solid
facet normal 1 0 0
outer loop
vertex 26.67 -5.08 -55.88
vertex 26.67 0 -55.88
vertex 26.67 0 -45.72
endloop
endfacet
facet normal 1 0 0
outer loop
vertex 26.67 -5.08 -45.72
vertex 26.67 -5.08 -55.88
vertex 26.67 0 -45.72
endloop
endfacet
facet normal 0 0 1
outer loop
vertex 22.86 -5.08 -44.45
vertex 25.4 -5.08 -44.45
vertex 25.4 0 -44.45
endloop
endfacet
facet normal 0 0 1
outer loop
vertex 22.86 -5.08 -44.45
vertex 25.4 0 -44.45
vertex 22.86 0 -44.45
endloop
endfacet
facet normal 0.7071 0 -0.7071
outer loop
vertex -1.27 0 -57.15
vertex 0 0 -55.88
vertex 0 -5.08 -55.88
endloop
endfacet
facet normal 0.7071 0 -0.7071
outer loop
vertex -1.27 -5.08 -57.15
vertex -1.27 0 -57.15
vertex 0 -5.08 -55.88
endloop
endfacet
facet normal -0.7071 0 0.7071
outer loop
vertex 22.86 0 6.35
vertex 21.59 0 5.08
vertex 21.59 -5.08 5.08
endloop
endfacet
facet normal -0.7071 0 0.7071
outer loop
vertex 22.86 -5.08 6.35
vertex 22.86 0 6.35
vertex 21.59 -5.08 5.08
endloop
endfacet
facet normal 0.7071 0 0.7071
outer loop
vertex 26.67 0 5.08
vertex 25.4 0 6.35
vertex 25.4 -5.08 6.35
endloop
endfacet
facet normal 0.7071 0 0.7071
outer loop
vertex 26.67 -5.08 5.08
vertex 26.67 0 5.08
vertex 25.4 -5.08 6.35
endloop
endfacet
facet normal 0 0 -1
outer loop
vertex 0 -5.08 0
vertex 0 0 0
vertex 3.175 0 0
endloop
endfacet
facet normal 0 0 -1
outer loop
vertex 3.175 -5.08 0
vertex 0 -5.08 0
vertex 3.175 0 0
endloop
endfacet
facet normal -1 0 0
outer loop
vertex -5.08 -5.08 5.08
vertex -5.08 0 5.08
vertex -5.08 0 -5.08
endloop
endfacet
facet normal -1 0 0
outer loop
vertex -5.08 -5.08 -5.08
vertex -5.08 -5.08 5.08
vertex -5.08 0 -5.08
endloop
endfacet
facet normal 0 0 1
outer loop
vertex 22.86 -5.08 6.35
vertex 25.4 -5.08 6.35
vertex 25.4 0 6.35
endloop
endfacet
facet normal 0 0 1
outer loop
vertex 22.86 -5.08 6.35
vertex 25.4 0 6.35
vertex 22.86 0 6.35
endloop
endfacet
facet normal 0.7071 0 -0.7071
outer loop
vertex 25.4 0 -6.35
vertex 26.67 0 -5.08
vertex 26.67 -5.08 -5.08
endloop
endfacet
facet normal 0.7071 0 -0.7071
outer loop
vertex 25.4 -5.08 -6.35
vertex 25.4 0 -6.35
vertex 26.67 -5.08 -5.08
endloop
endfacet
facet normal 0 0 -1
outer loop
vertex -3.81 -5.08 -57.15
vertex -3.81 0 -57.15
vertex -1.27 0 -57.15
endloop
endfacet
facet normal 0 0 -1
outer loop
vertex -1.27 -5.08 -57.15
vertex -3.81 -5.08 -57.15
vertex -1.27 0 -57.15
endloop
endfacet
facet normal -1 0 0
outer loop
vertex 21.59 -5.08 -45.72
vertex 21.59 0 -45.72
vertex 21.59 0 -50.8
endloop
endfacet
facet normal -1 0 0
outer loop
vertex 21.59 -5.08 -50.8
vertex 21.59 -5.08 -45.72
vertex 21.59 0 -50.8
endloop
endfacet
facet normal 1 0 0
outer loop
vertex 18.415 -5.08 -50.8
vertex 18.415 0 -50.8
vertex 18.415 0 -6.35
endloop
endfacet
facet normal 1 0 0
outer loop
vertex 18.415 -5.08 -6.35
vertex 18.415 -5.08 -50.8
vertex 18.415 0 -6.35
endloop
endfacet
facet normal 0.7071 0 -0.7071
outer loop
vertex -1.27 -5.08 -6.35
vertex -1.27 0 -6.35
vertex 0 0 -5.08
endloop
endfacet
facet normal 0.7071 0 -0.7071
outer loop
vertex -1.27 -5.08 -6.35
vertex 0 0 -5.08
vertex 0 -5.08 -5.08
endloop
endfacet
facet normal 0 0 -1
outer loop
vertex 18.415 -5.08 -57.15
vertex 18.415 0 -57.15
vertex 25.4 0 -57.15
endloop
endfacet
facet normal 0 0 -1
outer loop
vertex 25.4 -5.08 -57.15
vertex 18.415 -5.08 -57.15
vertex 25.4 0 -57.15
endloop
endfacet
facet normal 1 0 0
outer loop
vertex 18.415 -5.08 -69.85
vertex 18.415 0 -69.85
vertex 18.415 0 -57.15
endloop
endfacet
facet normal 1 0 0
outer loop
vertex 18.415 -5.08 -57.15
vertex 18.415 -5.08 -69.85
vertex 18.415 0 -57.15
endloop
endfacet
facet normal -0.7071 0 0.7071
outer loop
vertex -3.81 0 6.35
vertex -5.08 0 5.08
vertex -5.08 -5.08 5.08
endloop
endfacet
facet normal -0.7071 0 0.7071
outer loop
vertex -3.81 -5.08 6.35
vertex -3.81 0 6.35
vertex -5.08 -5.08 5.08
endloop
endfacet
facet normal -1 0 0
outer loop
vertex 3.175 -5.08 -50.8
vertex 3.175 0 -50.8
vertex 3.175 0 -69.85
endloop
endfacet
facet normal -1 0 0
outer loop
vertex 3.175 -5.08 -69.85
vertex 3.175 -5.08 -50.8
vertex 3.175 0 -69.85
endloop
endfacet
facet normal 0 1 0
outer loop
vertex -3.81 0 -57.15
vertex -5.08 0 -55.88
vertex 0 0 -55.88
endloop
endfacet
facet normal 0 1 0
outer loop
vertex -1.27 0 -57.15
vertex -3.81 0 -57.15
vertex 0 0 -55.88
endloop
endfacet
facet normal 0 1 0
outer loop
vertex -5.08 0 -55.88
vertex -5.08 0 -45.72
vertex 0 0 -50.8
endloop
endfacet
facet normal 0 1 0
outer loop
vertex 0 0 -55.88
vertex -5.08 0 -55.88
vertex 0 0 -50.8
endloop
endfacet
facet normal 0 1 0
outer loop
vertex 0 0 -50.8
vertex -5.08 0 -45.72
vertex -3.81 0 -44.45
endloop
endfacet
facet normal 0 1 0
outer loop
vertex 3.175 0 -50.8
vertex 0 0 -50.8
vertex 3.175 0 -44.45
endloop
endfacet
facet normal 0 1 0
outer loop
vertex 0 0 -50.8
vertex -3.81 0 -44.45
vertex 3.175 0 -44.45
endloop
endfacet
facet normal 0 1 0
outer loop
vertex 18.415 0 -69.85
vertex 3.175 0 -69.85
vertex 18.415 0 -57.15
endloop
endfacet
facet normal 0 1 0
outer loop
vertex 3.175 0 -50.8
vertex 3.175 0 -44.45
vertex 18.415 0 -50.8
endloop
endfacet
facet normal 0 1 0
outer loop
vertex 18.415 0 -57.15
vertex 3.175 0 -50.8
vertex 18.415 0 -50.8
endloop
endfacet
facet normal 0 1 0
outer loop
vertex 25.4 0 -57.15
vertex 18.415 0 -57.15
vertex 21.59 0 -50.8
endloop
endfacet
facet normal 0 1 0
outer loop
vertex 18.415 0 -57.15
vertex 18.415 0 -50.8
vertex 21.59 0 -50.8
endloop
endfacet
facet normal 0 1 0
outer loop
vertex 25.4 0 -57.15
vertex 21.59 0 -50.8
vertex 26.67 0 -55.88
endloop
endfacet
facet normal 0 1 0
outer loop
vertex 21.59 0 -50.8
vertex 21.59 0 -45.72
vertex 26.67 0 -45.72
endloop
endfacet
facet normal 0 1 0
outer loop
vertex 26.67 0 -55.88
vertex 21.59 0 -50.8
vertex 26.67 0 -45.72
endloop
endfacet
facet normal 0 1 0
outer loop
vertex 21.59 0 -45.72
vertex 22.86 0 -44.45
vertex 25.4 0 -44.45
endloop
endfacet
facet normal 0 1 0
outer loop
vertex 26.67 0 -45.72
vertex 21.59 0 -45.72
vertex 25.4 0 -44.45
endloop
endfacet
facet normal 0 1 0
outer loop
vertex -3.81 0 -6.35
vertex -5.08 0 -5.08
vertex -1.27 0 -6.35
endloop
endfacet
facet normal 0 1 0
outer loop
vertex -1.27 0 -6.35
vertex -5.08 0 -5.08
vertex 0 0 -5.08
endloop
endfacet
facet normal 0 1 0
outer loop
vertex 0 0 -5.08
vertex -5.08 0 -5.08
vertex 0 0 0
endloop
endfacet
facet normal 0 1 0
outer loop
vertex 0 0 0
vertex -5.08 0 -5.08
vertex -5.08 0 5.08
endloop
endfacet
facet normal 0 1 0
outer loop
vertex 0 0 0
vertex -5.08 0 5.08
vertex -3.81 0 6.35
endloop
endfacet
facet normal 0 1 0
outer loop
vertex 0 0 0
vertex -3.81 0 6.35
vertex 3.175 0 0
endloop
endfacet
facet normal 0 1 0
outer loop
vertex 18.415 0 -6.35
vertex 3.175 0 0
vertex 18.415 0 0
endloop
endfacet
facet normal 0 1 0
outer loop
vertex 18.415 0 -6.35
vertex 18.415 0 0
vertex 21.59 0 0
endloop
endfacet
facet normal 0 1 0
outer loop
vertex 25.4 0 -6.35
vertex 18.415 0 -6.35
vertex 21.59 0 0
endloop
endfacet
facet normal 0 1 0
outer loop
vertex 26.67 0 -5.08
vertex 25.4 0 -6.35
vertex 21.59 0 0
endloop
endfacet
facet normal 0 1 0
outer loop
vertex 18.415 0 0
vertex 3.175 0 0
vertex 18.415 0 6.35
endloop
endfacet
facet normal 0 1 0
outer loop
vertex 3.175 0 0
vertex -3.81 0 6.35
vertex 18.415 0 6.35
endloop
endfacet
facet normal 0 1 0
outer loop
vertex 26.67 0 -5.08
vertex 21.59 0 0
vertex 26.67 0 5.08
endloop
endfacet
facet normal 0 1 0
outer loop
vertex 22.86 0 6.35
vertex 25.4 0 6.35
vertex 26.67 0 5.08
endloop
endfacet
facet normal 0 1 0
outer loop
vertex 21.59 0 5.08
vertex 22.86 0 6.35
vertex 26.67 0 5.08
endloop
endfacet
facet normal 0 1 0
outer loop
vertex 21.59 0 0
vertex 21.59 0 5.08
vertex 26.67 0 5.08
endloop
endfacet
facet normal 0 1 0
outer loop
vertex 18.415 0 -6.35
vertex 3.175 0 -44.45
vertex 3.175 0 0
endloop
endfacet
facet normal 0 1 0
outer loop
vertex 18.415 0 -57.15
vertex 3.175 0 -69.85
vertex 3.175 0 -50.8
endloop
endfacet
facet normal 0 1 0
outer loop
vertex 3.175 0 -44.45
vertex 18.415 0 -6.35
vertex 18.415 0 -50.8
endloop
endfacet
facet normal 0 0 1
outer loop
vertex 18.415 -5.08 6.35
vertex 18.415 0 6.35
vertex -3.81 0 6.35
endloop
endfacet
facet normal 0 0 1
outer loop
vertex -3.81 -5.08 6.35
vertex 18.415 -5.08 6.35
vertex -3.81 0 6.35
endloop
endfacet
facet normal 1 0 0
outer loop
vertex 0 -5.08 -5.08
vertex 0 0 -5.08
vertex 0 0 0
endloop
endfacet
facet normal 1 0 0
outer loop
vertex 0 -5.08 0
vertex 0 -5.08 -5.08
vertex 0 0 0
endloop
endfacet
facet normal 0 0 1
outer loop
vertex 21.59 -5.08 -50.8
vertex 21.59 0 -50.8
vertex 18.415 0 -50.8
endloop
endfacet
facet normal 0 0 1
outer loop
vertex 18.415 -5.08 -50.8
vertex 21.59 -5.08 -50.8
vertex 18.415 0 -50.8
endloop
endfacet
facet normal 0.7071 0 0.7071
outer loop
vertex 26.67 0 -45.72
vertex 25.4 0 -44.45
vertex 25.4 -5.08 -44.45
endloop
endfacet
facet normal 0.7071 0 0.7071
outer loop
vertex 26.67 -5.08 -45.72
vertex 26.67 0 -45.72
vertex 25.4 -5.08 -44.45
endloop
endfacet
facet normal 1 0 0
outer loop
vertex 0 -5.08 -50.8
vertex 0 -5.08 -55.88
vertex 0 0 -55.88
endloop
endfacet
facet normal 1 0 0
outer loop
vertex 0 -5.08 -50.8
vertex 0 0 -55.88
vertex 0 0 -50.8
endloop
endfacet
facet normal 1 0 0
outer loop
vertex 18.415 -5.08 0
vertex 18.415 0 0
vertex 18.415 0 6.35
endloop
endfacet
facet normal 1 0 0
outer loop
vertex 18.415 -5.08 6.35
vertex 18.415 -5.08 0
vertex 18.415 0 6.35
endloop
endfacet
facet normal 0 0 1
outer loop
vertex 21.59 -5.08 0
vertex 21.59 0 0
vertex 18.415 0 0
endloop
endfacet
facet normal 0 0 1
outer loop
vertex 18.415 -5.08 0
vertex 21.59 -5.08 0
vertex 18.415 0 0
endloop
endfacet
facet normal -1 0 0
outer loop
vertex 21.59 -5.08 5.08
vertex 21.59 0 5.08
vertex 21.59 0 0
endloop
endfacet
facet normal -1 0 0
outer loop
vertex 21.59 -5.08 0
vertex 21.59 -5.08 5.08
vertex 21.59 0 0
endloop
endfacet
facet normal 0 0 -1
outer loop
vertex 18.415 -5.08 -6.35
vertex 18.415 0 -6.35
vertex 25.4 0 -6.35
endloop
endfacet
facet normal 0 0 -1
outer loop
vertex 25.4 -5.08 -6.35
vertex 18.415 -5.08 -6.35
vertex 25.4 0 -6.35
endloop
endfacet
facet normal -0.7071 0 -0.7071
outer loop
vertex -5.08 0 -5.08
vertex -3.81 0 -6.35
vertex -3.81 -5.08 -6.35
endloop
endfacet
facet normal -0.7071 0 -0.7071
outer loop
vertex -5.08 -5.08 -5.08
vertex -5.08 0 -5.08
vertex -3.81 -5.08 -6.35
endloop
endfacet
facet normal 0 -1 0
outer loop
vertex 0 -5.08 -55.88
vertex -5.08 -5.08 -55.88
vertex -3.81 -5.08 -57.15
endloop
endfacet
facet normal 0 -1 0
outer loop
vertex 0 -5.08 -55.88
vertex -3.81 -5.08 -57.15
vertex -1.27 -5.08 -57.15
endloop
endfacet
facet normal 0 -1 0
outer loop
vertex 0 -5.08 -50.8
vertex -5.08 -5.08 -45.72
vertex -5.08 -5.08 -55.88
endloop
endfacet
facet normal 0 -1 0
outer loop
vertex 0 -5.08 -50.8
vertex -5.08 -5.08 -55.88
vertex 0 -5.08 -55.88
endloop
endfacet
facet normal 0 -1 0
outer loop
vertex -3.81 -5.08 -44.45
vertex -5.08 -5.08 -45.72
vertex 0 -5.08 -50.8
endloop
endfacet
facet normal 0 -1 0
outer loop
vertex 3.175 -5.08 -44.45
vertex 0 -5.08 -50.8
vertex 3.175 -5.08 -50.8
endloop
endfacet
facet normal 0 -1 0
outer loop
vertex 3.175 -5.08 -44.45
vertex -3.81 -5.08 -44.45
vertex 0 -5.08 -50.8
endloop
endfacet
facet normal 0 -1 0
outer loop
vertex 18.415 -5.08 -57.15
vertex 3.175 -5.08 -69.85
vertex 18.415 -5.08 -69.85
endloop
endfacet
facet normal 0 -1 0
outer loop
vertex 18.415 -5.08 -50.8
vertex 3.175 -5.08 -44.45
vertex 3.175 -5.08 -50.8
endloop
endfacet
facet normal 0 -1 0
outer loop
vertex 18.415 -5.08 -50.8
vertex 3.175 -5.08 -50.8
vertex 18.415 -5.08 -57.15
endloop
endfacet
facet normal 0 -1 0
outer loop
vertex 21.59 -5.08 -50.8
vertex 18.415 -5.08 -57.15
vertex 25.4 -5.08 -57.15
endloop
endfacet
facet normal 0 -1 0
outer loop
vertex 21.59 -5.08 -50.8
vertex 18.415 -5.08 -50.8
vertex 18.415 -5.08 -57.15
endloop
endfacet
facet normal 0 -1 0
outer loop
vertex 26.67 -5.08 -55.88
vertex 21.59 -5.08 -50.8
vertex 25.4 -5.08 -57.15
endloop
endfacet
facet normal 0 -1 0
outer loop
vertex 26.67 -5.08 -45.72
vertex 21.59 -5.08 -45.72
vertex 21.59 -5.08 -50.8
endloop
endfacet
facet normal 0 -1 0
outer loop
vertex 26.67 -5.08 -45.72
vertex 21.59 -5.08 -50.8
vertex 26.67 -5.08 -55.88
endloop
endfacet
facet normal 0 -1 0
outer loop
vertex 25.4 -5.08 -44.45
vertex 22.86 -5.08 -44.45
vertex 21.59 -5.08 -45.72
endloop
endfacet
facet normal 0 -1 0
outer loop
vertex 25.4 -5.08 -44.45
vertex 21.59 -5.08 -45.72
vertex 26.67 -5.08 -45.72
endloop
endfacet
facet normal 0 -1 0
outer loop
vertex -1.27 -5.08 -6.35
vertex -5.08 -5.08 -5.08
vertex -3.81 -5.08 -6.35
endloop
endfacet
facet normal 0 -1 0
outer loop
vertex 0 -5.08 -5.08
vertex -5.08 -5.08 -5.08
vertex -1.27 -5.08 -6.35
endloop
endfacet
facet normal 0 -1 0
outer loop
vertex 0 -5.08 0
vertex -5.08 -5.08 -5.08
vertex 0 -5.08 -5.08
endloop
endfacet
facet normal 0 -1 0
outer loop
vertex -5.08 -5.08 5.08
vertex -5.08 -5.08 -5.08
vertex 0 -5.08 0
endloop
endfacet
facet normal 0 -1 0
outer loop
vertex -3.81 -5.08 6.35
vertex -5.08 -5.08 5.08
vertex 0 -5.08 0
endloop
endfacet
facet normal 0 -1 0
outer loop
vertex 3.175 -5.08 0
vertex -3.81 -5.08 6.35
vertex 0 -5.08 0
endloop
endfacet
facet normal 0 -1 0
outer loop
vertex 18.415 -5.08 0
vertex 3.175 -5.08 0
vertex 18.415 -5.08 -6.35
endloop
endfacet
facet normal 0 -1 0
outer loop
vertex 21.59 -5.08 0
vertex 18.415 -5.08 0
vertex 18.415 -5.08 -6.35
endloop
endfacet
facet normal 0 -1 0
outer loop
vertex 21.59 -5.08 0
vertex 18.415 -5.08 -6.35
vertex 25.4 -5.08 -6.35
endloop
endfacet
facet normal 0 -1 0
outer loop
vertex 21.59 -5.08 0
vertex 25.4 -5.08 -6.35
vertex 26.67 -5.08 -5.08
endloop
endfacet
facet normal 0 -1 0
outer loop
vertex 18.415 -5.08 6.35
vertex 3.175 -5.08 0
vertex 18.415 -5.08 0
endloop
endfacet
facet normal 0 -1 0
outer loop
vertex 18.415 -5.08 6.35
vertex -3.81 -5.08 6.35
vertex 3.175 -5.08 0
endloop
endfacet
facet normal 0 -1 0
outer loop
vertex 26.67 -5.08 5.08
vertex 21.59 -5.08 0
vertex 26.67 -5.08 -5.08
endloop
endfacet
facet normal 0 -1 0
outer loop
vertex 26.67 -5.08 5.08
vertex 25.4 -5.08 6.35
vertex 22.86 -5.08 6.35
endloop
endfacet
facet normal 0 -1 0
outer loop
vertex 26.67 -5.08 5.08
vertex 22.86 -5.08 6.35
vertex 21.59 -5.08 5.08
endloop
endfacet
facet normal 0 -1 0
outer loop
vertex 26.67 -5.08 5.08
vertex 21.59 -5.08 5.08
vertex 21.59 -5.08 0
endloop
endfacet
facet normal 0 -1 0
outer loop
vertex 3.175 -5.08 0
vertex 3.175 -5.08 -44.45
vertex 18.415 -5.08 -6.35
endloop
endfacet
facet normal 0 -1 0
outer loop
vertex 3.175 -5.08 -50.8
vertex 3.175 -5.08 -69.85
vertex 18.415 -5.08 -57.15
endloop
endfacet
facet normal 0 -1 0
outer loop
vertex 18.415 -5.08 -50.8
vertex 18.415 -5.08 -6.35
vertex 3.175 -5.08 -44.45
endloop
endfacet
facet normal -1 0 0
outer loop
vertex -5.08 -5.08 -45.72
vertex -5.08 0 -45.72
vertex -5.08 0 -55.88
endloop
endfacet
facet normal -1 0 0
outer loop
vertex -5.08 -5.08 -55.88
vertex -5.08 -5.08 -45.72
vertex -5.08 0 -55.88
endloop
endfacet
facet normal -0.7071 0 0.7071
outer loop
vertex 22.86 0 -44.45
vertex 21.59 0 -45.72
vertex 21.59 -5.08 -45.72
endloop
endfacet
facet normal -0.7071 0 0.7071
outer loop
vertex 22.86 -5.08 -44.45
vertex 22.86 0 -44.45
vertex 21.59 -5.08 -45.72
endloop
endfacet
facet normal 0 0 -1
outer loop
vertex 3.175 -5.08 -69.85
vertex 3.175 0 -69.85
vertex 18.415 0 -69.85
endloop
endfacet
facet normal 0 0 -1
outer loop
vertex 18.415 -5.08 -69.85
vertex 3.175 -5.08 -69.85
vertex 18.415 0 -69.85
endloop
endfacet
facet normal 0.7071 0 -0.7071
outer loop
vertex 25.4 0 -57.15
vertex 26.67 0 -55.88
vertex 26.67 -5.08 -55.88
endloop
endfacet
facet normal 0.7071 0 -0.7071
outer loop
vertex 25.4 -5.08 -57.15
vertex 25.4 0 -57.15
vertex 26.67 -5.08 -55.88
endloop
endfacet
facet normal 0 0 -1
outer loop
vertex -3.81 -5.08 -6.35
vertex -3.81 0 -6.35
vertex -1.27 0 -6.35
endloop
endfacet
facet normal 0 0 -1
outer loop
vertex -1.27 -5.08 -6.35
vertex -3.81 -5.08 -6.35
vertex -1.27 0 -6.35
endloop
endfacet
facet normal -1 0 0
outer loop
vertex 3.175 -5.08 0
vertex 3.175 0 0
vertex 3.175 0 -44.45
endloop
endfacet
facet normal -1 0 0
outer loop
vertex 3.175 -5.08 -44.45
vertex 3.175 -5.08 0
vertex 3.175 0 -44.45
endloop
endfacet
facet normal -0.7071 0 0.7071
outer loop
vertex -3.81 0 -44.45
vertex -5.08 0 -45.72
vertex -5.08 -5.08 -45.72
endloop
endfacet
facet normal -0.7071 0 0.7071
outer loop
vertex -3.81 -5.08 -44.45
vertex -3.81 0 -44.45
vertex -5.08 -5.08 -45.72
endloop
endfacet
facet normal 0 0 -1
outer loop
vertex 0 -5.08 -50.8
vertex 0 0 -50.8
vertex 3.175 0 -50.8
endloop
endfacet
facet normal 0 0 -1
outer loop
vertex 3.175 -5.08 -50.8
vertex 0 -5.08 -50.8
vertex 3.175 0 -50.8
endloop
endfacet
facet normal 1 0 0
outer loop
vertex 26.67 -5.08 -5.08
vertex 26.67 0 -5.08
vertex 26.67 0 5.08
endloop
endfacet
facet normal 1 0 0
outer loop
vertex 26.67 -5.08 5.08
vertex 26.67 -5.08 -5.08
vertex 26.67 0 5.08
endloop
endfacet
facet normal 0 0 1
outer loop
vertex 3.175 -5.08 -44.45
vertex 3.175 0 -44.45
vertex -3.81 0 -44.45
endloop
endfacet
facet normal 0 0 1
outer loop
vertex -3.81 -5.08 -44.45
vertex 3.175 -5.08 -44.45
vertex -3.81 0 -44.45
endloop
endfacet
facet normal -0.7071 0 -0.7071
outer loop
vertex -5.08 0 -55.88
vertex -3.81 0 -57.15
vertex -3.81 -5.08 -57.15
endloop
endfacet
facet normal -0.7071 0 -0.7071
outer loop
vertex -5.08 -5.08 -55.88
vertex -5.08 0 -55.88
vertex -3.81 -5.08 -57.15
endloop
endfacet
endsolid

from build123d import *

# Parameters (mm, degrees)
F1_DEPTH = 5.08
F2_SIZE  = 1.27


with BuildPart() as f1:
    # F0 (on Front) → F1 (new body)
    with BuildSketch(Plane.XZ):
        Polygon((0, -6.35), (0, 0), (3.175, 0), (3.175, -44.45), (3.175, -50.8), (18.415, -50.8), (18.415, -6.35), (18.415, 0), (18.415, 6.35), (3.175, 6.35), (-5.08, 6.35), (-5.08, -6.35), align=None)
        Polygon((3.175, -50.8), (3.175, -44.45), (-5.08, -44.45), (-5.08, -57.15), (0, -57.15), (0, -50.8), (0.926509, -50.8), align=None)
        Polygon((18.415, -50.8), (3.175, -50.8), (3.175, -69.85), (18.415, -69.85), (18.415, -57.15), align=None)
        Polygon((21.59, -50.8), (18.415, -50.8), (18.415, -57.15), (26.67, -57.15), (26.67, -44.45), (21.59, -44.45), align=None)
        Polygon((18.415, 0), (18.415, -6.35), (26.67, -6.35), (26.67, 6.35), (21.59, 6.35), (21.59, 0), align=None)
    extrude(amount=F1_DEPTH)

    # F2
    f2_edges = [f1.edges().sort_by_distance(p)[0] for p in [
        (21.59, -2.54, 6.35),
        (26.67, -2.54, 6.35),
        (26.67, -2.54, -6.35),
        (0, -2.54, -6.35),
        (-5.08, -2.54, -6.35),
        (-5.08, -2.54, 6.35),
        (26.67, -2.54, -44.45),
        (21.59, -2.54, -44.45),
        (26.67, -2.54, -57.15),
        (-5.08, -2.54, -44.45),
        (-5.08, -2.54, -57.15),
        (0, -2.54, -57.15),
    ]]
    chamfer(f2_edges, length=F2_SIZE)


solid = f1.part
